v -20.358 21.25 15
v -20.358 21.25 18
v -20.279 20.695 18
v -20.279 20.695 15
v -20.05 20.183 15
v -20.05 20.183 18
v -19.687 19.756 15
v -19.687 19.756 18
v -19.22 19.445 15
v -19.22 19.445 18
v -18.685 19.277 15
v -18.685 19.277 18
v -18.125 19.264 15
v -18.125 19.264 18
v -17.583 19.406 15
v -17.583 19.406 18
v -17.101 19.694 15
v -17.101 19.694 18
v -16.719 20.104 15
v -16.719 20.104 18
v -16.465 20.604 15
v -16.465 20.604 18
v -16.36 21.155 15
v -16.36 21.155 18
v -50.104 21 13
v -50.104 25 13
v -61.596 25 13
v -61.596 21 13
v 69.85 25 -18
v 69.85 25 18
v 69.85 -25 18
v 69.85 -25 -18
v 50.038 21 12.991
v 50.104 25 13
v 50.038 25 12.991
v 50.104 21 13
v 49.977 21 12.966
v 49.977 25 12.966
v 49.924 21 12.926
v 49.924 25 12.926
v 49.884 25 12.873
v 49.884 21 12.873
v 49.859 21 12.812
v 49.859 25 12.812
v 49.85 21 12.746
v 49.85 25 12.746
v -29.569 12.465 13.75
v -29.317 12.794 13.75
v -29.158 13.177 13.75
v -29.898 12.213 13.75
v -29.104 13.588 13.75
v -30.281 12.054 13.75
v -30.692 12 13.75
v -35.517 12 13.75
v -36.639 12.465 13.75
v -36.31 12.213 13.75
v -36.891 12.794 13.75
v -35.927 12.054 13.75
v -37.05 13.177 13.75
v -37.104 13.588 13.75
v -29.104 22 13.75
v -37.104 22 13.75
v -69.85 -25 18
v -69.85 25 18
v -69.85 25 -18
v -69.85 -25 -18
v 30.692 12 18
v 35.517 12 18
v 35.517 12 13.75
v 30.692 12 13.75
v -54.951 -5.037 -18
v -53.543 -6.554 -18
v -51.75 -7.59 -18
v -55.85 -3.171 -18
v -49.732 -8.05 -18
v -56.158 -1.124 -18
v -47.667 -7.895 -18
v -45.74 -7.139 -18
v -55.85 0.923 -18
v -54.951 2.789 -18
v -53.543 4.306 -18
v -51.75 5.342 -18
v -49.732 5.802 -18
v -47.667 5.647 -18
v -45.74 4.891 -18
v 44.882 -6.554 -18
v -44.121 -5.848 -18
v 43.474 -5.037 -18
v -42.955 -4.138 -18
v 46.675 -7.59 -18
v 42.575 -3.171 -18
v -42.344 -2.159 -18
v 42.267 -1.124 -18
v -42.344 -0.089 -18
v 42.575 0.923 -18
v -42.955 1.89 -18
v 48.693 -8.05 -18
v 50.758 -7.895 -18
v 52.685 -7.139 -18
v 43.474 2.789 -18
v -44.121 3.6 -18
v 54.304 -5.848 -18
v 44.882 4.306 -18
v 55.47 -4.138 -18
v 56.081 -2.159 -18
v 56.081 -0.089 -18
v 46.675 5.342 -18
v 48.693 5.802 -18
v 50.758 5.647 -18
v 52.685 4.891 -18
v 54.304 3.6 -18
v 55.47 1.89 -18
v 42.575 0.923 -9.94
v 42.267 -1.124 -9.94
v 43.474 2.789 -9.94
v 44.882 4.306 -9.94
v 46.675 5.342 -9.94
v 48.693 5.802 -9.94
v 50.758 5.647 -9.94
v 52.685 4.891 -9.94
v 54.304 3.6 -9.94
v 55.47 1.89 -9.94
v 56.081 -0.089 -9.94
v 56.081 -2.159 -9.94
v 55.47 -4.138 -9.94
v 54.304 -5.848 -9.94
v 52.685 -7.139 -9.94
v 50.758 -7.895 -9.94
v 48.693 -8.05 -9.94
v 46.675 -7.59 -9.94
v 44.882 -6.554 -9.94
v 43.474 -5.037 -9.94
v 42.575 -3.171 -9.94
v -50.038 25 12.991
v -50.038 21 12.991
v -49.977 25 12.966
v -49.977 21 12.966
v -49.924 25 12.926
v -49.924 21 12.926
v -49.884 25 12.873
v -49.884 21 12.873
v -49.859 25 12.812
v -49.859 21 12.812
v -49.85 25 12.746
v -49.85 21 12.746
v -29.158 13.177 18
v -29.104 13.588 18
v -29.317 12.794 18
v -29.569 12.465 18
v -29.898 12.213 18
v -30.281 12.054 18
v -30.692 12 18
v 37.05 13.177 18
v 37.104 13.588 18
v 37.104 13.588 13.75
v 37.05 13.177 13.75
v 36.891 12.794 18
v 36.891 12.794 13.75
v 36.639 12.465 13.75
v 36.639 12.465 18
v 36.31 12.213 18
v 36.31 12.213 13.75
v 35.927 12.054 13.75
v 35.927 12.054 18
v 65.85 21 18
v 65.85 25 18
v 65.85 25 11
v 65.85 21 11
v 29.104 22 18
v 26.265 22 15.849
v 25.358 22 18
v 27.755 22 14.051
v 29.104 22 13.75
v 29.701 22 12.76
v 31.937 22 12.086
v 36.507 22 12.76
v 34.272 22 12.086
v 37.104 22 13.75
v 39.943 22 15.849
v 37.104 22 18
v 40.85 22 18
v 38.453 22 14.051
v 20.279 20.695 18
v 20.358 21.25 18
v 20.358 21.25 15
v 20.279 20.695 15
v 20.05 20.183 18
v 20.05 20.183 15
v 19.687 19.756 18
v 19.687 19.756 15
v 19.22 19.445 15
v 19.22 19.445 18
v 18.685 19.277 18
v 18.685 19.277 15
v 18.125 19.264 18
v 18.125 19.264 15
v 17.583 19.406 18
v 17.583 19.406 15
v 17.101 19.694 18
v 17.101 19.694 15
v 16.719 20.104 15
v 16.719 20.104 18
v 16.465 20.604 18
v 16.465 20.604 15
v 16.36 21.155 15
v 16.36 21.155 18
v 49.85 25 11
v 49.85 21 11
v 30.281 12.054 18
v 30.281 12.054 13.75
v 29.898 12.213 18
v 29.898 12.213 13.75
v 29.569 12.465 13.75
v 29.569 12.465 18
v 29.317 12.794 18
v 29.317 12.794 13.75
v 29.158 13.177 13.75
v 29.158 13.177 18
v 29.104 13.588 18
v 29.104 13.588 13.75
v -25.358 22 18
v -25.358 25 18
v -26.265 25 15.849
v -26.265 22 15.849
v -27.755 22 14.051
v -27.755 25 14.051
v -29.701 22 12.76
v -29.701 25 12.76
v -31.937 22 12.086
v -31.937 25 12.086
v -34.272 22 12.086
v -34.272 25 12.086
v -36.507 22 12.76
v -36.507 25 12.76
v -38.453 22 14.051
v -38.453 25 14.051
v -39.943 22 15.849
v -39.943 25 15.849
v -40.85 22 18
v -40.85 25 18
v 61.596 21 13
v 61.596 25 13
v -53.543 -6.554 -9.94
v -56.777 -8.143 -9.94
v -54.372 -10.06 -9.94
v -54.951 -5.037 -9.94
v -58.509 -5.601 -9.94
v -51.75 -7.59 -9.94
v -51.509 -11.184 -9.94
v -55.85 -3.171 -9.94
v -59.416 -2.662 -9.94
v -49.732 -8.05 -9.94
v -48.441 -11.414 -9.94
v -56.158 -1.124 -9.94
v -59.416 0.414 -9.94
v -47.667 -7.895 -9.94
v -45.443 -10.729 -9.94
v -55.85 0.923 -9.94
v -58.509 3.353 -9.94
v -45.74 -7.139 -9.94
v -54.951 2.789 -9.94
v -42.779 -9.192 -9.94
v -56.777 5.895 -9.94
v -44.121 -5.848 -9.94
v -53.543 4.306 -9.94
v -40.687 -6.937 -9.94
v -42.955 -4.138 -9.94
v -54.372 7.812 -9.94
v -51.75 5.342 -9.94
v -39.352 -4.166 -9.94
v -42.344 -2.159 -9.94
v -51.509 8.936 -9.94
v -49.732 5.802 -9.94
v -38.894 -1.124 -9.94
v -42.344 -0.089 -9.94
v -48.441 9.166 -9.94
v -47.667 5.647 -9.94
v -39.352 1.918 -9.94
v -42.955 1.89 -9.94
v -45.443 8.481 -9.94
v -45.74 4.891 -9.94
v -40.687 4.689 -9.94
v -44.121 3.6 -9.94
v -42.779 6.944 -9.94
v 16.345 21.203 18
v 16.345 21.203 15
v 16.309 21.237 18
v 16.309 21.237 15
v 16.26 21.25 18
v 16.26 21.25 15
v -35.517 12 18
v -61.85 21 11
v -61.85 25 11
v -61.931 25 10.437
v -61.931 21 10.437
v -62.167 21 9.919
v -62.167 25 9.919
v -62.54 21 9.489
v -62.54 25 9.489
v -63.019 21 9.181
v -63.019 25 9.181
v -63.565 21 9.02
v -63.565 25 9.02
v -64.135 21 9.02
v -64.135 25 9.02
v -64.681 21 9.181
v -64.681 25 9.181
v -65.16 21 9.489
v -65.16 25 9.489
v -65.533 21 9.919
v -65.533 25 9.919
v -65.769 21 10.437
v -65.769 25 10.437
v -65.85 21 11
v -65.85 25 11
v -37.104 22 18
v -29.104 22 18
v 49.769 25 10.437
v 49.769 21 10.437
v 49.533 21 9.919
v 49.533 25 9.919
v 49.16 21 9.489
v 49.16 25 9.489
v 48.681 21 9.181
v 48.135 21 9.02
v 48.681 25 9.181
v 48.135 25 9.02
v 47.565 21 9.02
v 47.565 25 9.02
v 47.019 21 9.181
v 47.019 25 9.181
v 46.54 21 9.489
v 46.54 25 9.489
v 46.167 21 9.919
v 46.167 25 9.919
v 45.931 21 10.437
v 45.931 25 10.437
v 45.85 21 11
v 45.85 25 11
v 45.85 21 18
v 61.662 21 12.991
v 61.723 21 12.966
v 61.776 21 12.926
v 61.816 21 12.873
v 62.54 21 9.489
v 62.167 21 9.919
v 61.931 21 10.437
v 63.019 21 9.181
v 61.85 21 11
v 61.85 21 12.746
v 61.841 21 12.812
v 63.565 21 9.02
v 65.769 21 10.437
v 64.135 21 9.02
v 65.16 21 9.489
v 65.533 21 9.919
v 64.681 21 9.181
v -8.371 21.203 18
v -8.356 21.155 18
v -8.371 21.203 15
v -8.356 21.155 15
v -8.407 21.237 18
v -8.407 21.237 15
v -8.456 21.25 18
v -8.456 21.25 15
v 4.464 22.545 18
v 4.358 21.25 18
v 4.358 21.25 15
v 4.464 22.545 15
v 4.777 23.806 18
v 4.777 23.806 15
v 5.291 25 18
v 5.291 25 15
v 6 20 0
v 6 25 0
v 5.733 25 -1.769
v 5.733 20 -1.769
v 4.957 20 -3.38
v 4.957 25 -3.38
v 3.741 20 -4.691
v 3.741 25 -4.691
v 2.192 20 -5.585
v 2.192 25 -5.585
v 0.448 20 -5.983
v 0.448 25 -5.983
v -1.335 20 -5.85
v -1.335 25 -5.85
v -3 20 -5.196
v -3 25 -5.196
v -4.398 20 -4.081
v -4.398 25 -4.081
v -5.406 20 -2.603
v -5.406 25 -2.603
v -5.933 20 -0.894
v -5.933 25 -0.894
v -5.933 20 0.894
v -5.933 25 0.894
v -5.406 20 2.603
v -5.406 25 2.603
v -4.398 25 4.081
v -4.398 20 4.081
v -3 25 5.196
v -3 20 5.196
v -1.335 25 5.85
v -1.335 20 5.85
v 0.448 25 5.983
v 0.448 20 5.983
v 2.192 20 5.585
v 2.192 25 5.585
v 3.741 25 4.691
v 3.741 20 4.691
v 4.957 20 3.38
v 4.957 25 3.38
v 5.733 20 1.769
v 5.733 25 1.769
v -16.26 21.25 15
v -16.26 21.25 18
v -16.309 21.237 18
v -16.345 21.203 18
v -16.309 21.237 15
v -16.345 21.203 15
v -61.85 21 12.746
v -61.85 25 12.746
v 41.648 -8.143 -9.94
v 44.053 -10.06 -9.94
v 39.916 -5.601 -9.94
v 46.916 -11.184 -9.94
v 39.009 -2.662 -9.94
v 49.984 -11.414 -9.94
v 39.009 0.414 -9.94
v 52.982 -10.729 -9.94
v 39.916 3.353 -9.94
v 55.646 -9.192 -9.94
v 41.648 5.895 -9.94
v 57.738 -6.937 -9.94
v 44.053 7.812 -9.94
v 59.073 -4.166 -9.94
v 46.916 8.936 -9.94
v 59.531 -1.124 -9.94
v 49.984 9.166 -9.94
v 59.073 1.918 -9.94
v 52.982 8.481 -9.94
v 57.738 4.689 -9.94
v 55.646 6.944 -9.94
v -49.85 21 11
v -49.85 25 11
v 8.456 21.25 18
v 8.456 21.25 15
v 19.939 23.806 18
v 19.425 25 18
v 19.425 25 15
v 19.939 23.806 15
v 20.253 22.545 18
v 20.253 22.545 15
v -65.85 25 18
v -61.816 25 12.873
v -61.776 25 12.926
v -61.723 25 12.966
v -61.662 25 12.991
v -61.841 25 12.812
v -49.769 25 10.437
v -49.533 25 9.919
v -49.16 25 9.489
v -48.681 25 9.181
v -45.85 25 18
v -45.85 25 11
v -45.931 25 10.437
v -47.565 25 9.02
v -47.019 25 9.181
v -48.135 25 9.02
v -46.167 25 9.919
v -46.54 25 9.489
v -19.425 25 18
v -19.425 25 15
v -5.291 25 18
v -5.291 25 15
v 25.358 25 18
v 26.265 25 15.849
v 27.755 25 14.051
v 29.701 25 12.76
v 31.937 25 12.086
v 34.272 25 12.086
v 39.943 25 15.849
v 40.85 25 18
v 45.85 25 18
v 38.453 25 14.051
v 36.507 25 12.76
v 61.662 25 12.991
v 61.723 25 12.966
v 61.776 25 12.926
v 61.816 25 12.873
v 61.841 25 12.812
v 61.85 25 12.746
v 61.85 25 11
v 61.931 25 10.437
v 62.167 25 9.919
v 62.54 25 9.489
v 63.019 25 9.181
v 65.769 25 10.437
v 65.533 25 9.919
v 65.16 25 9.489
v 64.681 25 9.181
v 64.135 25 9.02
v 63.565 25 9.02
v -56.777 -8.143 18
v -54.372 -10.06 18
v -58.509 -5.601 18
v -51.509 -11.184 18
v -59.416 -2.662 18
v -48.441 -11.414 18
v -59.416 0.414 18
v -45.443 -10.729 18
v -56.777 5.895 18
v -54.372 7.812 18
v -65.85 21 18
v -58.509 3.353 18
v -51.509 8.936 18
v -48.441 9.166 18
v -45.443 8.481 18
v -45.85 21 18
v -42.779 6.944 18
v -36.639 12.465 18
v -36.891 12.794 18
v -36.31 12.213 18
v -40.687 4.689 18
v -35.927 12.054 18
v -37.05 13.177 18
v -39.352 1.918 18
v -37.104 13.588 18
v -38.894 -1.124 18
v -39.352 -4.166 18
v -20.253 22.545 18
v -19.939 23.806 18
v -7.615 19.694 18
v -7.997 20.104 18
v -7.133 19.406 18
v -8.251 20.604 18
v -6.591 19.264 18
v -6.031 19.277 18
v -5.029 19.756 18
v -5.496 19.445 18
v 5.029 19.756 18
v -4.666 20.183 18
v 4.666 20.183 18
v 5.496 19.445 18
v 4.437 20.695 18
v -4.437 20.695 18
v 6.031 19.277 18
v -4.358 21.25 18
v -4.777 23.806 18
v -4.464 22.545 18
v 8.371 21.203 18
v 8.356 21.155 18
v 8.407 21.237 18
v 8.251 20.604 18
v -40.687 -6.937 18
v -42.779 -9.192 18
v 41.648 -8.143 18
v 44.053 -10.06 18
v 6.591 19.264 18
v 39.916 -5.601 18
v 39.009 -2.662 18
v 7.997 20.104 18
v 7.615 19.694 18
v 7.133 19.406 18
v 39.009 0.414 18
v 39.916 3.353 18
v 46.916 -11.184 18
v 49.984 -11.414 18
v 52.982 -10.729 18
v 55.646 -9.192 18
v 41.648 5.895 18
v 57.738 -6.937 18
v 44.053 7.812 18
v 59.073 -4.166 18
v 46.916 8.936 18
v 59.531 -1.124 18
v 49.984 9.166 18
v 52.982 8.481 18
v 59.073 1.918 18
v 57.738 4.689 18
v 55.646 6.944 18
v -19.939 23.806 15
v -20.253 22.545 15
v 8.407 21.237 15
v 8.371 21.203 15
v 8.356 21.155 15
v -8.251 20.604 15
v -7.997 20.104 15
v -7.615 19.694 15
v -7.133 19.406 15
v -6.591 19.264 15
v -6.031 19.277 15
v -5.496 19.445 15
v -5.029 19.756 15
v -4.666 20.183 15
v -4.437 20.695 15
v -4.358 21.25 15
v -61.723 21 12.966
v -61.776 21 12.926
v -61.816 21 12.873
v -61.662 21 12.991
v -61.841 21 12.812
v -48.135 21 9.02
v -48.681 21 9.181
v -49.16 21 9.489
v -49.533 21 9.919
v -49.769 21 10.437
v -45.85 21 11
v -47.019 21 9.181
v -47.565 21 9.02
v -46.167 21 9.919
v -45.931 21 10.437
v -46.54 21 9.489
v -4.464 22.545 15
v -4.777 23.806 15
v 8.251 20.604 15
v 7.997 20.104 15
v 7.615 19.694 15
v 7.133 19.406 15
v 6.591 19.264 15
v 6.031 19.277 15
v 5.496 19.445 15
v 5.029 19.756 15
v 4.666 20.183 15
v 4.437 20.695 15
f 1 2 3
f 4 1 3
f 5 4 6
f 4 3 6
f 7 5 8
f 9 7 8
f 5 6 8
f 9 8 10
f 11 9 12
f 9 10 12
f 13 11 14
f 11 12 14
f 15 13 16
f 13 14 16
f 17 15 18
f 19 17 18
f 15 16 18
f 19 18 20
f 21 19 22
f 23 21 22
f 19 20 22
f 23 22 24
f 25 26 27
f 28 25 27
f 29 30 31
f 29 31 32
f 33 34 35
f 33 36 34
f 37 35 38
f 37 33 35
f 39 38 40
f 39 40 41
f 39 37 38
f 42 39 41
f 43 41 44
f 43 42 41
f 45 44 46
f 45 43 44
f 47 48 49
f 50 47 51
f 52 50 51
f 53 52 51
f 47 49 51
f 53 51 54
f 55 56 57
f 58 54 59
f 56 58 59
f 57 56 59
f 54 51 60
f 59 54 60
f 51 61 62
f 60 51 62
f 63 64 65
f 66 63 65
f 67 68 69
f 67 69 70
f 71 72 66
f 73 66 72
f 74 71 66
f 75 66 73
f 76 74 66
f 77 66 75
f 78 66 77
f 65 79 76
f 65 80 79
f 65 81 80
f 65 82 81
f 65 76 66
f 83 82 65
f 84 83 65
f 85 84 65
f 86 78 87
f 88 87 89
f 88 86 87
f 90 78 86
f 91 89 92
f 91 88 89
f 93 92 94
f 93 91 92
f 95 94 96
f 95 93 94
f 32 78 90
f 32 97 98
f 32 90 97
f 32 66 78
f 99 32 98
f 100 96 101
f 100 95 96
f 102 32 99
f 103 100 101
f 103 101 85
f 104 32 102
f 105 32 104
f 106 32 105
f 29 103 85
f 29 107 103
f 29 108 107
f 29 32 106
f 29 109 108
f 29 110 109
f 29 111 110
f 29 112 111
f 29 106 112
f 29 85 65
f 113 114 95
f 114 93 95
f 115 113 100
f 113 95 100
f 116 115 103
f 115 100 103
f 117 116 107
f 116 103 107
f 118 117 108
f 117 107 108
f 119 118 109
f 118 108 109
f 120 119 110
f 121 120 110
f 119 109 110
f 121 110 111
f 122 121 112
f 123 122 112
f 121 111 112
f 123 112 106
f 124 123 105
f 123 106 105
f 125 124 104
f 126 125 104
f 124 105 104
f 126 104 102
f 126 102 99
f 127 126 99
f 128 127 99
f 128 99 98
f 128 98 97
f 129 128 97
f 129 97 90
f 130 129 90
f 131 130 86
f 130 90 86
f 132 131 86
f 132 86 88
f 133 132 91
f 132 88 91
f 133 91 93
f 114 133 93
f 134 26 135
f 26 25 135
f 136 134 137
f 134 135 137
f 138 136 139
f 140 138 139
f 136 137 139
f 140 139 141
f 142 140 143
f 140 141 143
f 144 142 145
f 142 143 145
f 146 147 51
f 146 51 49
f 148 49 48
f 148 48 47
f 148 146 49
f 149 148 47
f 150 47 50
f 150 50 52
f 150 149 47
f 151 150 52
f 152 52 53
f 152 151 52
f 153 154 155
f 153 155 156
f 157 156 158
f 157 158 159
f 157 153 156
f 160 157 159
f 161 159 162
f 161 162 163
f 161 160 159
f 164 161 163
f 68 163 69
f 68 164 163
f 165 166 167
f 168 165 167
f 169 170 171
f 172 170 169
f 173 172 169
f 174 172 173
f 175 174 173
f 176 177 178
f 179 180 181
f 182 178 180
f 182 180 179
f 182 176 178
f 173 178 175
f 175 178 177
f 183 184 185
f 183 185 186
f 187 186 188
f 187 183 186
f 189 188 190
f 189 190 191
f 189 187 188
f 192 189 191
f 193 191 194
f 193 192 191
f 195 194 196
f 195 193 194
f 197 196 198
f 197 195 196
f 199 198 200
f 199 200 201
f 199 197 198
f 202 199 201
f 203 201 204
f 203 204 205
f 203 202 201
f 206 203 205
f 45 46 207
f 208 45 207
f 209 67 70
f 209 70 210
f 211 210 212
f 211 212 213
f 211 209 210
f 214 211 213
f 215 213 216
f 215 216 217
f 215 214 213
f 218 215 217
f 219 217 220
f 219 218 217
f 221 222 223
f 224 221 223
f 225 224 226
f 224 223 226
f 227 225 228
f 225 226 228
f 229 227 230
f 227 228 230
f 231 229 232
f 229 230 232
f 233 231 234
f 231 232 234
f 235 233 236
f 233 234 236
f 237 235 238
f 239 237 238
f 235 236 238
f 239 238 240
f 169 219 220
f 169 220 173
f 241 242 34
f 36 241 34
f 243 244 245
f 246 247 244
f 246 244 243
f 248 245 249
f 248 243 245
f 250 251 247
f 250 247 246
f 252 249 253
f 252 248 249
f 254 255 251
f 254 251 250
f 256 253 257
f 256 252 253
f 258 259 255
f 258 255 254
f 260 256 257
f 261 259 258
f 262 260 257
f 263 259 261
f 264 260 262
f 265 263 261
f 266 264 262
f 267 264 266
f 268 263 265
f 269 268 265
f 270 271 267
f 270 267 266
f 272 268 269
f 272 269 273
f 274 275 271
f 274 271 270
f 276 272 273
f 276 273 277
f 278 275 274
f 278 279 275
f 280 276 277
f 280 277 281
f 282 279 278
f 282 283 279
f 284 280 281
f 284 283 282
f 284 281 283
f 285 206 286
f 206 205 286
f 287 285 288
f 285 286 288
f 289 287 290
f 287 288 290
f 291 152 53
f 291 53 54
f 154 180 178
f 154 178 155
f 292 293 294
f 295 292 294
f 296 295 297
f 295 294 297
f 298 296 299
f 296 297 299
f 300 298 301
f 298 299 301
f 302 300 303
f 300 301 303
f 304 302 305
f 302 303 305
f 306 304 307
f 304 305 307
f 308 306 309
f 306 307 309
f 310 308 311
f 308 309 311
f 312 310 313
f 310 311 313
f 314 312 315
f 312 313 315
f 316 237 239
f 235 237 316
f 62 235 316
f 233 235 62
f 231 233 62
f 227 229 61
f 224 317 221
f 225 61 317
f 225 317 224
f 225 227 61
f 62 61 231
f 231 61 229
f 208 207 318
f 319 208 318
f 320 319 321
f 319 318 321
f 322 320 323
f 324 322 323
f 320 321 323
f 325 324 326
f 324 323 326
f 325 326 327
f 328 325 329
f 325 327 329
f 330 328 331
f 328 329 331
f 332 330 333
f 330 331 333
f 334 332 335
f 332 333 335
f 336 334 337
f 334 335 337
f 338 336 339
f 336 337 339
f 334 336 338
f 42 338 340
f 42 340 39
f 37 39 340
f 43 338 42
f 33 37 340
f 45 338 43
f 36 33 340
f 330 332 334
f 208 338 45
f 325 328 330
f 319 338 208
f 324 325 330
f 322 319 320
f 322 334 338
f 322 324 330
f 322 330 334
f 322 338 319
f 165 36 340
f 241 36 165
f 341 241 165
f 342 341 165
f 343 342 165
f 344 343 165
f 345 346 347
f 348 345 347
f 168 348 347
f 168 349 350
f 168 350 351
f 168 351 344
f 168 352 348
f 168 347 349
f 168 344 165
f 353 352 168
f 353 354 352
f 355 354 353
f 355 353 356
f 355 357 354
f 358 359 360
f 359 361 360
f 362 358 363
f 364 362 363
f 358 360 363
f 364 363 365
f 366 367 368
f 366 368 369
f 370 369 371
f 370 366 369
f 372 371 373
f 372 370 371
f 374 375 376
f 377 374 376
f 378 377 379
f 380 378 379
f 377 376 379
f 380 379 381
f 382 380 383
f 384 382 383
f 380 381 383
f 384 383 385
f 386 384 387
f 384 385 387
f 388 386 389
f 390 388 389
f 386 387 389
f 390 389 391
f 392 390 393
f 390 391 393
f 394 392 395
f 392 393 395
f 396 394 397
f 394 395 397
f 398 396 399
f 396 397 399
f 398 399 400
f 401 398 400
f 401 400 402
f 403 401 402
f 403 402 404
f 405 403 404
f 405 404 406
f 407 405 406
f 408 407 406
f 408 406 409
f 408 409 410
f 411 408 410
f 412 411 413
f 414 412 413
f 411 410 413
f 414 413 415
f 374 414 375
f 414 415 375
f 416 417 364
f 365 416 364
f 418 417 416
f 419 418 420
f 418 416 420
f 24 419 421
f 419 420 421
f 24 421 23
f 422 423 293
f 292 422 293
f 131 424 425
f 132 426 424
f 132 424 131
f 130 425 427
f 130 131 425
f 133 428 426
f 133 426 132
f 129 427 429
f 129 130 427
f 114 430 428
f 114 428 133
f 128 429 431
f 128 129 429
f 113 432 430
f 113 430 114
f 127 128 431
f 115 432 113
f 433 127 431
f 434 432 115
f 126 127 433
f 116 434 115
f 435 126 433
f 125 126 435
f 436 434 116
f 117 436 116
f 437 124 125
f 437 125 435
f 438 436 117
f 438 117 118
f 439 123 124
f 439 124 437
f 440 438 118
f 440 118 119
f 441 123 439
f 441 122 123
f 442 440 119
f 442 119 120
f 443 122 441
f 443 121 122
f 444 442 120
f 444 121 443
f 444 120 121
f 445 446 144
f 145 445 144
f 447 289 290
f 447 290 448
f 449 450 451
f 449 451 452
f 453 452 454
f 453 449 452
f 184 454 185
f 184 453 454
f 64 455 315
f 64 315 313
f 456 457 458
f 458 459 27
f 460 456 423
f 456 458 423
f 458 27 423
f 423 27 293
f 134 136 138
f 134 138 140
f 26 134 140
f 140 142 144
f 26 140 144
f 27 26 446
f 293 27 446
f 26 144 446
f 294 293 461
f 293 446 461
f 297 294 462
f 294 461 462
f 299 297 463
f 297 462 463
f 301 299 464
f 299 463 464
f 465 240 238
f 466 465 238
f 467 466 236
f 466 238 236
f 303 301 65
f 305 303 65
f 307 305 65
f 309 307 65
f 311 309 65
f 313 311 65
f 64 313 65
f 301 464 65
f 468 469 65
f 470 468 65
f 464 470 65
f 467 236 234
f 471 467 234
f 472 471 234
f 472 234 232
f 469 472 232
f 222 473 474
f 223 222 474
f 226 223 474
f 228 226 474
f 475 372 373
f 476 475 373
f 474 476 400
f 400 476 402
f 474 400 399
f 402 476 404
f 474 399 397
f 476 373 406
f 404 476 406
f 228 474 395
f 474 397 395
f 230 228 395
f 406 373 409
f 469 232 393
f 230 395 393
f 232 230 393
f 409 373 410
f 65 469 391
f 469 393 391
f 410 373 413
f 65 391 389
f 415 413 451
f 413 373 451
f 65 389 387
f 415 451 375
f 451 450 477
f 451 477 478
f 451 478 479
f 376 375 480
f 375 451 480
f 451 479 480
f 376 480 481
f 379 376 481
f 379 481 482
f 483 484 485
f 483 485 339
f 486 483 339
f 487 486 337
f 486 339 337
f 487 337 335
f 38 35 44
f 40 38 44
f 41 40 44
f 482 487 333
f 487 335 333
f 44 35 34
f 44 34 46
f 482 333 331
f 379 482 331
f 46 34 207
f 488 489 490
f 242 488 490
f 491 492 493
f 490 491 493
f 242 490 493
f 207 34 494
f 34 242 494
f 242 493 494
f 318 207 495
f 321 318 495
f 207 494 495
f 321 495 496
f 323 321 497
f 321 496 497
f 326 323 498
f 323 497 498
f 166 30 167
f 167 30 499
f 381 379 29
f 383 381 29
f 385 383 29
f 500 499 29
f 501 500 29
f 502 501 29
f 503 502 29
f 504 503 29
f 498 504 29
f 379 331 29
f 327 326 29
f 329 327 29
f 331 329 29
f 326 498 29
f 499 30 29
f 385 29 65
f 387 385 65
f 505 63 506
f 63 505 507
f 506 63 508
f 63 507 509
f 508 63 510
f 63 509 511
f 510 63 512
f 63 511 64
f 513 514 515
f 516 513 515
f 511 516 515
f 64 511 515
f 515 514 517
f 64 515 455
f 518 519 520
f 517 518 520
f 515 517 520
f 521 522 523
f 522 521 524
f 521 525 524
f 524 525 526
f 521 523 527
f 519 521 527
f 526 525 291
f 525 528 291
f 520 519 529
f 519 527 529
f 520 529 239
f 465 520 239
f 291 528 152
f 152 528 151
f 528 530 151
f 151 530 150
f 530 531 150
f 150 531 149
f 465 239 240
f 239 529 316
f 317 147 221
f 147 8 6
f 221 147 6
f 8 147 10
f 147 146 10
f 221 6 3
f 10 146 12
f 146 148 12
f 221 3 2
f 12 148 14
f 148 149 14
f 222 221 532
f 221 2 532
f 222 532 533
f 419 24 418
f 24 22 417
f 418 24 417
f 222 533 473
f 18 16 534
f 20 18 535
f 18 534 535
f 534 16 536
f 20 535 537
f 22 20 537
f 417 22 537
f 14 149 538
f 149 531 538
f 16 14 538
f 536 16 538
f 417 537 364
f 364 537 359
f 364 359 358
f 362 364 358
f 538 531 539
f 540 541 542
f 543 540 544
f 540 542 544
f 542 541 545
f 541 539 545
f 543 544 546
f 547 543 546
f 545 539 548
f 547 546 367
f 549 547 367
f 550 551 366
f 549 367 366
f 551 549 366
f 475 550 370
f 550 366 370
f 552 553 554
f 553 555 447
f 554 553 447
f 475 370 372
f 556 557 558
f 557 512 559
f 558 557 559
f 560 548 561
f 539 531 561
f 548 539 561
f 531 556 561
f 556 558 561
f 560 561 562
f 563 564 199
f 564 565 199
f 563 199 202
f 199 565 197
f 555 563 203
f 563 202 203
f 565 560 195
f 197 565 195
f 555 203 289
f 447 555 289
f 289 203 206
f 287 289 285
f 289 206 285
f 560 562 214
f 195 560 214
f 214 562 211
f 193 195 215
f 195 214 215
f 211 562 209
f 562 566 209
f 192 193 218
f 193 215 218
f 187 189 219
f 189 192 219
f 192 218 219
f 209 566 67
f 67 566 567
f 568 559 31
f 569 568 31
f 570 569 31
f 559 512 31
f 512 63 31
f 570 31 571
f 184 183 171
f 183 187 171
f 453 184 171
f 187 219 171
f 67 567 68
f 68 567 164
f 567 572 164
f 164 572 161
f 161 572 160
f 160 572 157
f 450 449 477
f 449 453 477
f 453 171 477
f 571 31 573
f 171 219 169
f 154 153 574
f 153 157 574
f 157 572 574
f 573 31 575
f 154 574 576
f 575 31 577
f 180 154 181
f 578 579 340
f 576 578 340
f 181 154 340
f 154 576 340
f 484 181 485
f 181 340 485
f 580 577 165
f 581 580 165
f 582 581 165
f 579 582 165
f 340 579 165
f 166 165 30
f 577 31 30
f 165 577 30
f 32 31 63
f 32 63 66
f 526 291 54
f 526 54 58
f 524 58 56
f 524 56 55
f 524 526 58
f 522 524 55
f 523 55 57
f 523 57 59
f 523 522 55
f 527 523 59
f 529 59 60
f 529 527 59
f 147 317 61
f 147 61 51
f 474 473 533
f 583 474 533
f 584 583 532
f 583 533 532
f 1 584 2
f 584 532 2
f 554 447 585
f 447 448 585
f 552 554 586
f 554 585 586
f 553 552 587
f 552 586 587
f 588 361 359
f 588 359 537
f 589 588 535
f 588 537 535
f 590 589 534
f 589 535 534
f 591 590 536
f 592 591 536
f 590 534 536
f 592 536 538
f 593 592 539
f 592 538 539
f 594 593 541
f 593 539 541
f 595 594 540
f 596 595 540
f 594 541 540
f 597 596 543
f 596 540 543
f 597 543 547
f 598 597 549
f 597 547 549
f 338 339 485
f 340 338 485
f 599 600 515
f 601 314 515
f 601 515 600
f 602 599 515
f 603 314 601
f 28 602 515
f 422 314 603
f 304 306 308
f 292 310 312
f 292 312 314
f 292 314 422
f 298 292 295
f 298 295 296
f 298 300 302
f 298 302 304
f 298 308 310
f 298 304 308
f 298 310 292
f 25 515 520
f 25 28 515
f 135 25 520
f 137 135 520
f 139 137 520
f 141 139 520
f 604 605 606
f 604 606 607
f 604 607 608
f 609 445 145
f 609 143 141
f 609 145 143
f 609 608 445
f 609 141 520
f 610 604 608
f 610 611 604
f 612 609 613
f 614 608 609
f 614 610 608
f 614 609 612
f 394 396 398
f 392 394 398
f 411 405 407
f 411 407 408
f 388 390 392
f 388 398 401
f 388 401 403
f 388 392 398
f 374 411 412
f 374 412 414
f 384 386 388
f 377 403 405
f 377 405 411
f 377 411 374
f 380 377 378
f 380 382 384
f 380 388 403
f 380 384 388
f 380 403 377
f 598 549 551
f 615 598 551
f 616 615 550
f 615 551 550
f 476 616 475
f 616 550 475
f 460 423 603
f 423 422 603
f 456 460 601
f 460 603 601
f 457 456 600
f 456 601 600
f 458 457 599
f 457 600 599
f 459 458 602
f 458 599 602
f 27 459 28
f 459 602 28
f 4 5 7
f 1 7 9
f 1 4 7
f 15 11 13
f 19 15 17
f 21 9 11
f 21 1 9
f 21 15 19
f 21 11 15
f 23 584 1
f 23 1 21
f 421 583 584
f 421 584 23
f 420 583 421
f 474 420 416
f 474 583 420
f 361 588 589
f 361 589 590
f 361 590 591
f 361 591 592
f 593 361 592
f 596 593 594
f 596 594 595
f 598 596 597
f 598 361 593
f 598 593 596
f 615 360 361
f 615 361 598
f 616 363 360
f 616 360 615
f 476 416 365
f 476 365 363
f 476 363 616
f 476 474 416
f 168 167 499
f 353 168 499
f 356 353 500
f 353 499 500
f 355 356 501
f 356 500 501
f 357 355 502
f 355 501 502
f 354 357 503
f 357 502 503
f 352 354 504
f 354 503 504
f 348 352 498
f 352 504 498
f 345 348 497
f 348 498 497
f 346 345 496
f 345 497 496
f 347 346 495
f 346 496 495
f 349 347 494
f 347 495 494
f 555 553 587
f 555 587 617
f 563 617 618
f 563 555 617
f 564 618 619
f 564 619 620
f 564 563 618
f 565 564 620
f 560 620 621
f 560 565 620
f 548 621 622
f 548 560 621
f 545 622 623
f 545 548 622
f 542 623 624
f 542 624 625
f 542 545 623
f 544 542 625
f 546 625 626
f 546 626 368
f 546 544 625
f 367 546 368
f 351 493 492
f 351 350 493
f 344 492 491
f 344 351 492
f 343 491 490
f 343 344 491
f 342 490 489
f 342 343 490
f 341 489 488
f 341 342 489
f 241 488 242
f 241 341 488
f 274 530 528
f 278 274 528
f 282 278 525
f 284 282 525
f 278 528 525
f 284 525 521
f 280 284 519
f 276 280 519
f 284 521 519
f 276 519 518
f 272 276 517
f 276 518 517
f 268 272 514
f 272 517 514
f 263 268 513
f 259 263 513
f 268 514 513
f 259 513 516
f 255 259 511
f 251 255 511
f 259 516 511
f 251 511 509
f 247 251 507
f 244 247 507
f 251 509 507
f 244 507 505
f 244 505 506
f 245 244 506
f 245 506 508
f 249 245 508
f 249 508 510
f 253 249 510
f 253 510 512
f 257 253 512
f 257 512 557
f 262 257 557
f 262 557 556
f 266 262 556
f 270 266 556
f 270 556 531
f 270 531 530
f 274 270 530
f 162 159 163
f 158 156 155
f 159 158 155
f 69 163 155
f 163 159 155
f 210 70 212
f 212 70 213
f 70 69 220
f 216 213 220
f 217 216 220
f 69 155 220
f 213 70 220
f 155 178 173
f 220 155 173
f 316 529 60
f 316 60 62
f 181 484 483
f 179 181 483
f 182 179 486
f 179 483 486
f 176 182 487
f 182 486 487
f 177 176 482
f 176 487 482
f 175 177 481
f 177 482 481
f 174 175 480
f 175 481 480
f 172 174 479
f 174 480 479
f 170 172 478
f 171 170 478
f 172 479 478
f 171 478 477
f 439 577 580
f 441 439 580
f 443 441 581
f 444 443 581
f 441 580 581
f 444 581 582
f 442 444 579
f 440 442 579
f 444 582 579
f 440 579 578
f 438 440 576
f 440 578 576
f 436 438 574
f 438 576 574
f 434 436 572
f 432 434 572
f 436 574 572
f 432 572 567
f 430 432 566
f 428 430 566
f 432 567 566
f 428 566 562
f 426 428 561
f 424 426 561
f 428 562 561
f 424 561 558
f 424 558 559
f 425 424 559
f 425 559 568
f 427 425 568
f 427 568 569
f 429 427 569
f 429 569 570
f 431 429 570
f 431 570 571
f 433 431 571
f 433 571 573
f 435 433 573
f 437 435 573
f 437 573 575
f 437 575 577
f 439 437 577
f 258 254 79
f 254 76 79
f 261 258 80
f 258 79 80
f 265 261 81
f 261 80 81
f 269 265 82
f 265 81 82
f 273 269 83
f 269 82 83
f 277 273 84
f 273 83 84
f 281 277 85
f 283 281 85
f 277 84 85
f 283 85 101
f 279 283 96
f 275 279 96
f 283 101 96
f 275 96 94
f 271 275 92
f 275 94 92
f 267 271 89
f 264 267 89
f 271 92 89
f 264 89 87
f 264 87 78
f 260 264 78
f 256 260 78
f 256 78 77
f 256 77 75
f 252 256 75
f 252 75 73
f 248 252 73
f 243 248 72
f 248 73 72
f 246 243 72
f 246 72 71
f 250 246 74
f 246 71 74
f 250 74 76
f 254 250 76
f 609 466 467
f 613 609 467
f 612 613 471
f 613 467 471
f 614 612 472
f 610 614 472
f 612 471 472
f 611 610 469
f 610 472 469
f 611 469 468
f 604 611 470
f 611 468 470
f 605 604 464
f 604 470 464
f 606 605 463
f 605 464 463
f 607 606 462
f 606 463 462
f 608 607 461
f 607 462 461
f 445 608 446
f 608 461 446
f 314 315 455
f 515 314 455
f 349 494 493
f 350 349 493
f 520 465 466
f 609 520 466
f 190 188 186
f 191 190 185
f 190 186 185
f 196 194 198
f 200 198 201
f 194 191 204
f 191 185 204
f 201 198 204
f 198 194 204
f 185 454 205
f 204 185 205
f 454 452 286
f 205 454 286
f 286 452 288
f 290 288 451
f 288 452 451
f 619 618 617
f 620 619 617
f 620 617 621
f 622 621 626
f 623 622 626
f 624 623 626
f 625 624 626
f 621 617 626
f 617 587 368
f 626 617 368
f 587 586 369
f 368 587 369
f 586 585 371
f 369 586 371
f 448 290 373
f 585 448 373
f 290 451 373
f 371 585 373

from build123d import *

# Parameters (mm, degrees)
SKETCH1_W                                        = 36
SKETCH1_H                                        = 50
BOSS_EXTRUDE1_DEPTH                              = 69.85
CBORE_FOR_1_2_SOCKET_HEAD_CAP_SCREW1_D           = 13.89126
CBORE_FOR_1_2_SOCKET_HEAD_CAP_SCREW1_CBORE_D     = 20.6375
CBORE_FOR_1_2_SOCKET_HEAD_CAP_SCREW1_CBORE_DEPTH = 27.94
CUT_EXTRUDE1_DEPTH                               = 4
CUT_EXTRUDE2_DEPTH                               = 3
CUT_EXTRUDE4_DEPTH                               = 4.25
CUT_EXTRUDE5_DEPTH                               = 3
SKETCH10_R                                       = 6
CUT_EXTRUDE6_DEPTH                               = 5
FILLET1_R                                        = 0.1
FILLET2_R                                        = 0.254


with BuildPart() as part:
    # Sketch1 → Boss-Extrude1 (new body, symmetric)
    with BuildSketch(Plane(origin=(0, 0, 0), x_dir=(0, 0, -1), z_dir=(1, 0, 0))):
        Rectangle(SKETCH1_W, SKETCH1_H)
    extrude(amount=BOSS_EXTRUDE1_DEPTH, both=True)

    # CBORE for 1/2 Socket Head Cap Screw1 (through all)
    with Locations(Plane.XY.offset(18)):
        with Locations((-49.2125, -1.124), (49.2125, -1.124)):
            CounterBoreHole(CBORE_FOR_1_2_SOCKET_HEAD_CAP_SCREW1_D / 2, CBORE_FOR_1_2_SOCKET_HEAD_CAP_SCREW1_CBORE_D / 2, CBORE_FOR_1_2_SOCKET_HEAD_CAP_SCREW1_CBORE_DEPTH)

    # Sketch5 → Cut-Extrude1 (cut)
    with BuildSketch(Plane(origin=(0, 25, 0), x_dir=(1, 0, 0), z_dir=(0, 1, 0))):
        with BuildLine():
            Line((-65.85, -18), (-45.85, -18))
            Line((-45.85, -18), (-45.85, -11))
            ThreePointArc((-45.85, -11), (-47.85, -9), (-49.85, -11))
            Line((-49.85, -11), (-49.85, -13))
            Line((-49.85, -13), (-61.85, -13))
            Line((-61.85, -13), (-61.85, -11))
            ThreePointArc((-61.85, -11), (-63.85, -9), (-65.85, -11))
            Line((-65.85, -11), (-65.85, -18))
        make_face()
        with BuildLine():
            Line((45.85, -18), (65.85, -18))
            Line((65.85, -18), (65.85, -11))
            ThreePointArc((65.85, -11), (63.85, -9), (61.85, -11))
            Line((61.85, -11), (61.85, -13))
            Line((61.85, -13), (49.85, -13))
            Line((49.85, -13), (49.85, -11))
            ThreePointArc((49.85, -11), (47.85, -9), (45.85, -11))
            Line((45.85, -11), (45.85, -18))
        make_face()
    extrude(amount=-CUT_EXTRUDE1_DEPTH, mode=Mode.SUBTRACT)

    # Sketch6 → Cut-Extrude2 (cut)
    with BuildSketch(Plane(origin=(0, 25, 0), x_dir=(1, 0, 0), z_dir=(0, 1, 0))):
        with BuildLine():
            Line((-40.85, -18), (-25.358066615, -18))
            ThreePointArc((-25.358066615, -18), (-33.104033308, -12), (-40.85, -18))
        make_face()
        with BuildLine():
            Line((25.358066615, -18), (40.85, -18))
            ThreePointArc((40.85, -18), (33.104033308, -12), (25.358066615, -18))
        make_face()
    extrude(amount=-CUT_EXTRUDE2_DEPTH, mode=Mode.SUBTRACT)

    # Sketch8 → Cut-Extrude4 (cut)
    with BuildSketch(Plane.XY.offset(18)):
        with BuildLine():
            Line((-37.104033308, 22), (-29.104033308, 22))
            Line((-29.104033308, 22), (-29.104033308, 13.5875))
            ThreePointArc((-29.104033308, 13.5875), (-29.569001292, 12.464967985), (-30.691533308, 12))
            Line((-30.691533308, 12), (-35.516533308, 12))
            ThreePointArc((-35.516533308, 12), (-36.639065323, 12.464967985), (-37.104033308, 13.5875))
            Line((-37.104033308, 13.5875), (-37.104033308, 22))
        make_face()
        with BuildLine():
            Line((29.104033308, 22), (37.104033308, 22))
            Line((37.104033308, 22), (37.104033308, 13.5875))
            ThreePointArc((37.104033308, 13.5875), (36.639065323, 12.464967985), (35.516533308, 12))
            Line((35.516533308, 12), (30.691533308, 12))
            ThreePointArc((30.691533308, 12), (29.569001292, 12.464967985), (29.104033308, 13.5875))
            Line((29.104033308, 13.5875), (29.104033308, 22))
        make_face()
    extrude(amount=-CUT_EXTRUDE4_DEPTH, mode=Mode.SUBTRACT)

    # Sketch9 → Cut-Extrude5 (cut)
    with BuildSketch(Plane.XY.offset(18)):
        with BuildLine():
            Line((-16.358066615, 21.25), (-8.358066615, 21.25))
            ThreePointArc((-8.358066615, 21.25), (-6.358066615, 19.25), (-4.358066615, 21.25))
            ThreePointArc((-4.358066615, 21.25), (-4.59491081, 23.18220391), (-5.291419603, 25))
            Line((-5.291419603, 25), (-19.424713628, 25))
            ThreePointArc((-19.424713628, 25), (-20.12122242, 23.18220391), (-20.358066615, 21.25))
            ThreePointArc((-20.358066615, 21.25), (-18.358066615, 19.25), (-16.358066615, 21.25))
        make_face()
        with BuildLine():
            Line((5.291419603, 25), (19.424713628, 25))
            ThreePointArc((19.424713628, 25), (20.12122242, 23.18220391), (20.358066615, 21.25))
            ThreePointArc((20.358066615, 21.25), (18.358066615, 19.25), (16.358066615, 21.25))
            Line((16.358066615, 21.25), (8.358066615, 21.25))
            ThreePointArc((8.358066615, 21.25), (6.358066615, 19.25), (4.358066615, 21.25))
            ThreePointArc((4.358066615, 21.25), (4.59491081, 23.18220391), (5.291419603, 25))
        make_face()
    extrude(amount=-CUT_EXTRUDE5_DEPTH, mode=Mode.SUBTRACT)

    # Sketch10 → Cut-Extrude6 (cut)
    with BuildSketch(Plane(origin=(0, 25, 0), x_dir=(1, 0, 0), z_dir=(0, 1, 0))):
        Circle(SKETCH10_R)
    extrude(amount=-CUT_EXTRUDE6_DEPTH, mode=Mode.SUBTRACT)

    # Fillet1
    fillet1_edges = [part.edges().sort_by_distance(p)[0] for p in [
        (-16.358066615, 21.25, 16.5),
        (-8.358066615, 21.25, 16.5),
        (16.358066615, 21.25, 16.5),
        (8.358066615, 21.25, 16.5),
    ]]
    fillet(fillet1_edges, radius=FILLET1_R)

    # Fillet2
    fillet2_edges = [part.edges().sort_by_distance(p)[0] for p in [
        (-61.85, 23, 13),
        (-49.85, 23, 13),
        (49.85, 23, 13),
        (61.85, 23, 13),
    ]]
    fillet(fillet2_edges, radius=FILLET2_R)


solid = part.part
